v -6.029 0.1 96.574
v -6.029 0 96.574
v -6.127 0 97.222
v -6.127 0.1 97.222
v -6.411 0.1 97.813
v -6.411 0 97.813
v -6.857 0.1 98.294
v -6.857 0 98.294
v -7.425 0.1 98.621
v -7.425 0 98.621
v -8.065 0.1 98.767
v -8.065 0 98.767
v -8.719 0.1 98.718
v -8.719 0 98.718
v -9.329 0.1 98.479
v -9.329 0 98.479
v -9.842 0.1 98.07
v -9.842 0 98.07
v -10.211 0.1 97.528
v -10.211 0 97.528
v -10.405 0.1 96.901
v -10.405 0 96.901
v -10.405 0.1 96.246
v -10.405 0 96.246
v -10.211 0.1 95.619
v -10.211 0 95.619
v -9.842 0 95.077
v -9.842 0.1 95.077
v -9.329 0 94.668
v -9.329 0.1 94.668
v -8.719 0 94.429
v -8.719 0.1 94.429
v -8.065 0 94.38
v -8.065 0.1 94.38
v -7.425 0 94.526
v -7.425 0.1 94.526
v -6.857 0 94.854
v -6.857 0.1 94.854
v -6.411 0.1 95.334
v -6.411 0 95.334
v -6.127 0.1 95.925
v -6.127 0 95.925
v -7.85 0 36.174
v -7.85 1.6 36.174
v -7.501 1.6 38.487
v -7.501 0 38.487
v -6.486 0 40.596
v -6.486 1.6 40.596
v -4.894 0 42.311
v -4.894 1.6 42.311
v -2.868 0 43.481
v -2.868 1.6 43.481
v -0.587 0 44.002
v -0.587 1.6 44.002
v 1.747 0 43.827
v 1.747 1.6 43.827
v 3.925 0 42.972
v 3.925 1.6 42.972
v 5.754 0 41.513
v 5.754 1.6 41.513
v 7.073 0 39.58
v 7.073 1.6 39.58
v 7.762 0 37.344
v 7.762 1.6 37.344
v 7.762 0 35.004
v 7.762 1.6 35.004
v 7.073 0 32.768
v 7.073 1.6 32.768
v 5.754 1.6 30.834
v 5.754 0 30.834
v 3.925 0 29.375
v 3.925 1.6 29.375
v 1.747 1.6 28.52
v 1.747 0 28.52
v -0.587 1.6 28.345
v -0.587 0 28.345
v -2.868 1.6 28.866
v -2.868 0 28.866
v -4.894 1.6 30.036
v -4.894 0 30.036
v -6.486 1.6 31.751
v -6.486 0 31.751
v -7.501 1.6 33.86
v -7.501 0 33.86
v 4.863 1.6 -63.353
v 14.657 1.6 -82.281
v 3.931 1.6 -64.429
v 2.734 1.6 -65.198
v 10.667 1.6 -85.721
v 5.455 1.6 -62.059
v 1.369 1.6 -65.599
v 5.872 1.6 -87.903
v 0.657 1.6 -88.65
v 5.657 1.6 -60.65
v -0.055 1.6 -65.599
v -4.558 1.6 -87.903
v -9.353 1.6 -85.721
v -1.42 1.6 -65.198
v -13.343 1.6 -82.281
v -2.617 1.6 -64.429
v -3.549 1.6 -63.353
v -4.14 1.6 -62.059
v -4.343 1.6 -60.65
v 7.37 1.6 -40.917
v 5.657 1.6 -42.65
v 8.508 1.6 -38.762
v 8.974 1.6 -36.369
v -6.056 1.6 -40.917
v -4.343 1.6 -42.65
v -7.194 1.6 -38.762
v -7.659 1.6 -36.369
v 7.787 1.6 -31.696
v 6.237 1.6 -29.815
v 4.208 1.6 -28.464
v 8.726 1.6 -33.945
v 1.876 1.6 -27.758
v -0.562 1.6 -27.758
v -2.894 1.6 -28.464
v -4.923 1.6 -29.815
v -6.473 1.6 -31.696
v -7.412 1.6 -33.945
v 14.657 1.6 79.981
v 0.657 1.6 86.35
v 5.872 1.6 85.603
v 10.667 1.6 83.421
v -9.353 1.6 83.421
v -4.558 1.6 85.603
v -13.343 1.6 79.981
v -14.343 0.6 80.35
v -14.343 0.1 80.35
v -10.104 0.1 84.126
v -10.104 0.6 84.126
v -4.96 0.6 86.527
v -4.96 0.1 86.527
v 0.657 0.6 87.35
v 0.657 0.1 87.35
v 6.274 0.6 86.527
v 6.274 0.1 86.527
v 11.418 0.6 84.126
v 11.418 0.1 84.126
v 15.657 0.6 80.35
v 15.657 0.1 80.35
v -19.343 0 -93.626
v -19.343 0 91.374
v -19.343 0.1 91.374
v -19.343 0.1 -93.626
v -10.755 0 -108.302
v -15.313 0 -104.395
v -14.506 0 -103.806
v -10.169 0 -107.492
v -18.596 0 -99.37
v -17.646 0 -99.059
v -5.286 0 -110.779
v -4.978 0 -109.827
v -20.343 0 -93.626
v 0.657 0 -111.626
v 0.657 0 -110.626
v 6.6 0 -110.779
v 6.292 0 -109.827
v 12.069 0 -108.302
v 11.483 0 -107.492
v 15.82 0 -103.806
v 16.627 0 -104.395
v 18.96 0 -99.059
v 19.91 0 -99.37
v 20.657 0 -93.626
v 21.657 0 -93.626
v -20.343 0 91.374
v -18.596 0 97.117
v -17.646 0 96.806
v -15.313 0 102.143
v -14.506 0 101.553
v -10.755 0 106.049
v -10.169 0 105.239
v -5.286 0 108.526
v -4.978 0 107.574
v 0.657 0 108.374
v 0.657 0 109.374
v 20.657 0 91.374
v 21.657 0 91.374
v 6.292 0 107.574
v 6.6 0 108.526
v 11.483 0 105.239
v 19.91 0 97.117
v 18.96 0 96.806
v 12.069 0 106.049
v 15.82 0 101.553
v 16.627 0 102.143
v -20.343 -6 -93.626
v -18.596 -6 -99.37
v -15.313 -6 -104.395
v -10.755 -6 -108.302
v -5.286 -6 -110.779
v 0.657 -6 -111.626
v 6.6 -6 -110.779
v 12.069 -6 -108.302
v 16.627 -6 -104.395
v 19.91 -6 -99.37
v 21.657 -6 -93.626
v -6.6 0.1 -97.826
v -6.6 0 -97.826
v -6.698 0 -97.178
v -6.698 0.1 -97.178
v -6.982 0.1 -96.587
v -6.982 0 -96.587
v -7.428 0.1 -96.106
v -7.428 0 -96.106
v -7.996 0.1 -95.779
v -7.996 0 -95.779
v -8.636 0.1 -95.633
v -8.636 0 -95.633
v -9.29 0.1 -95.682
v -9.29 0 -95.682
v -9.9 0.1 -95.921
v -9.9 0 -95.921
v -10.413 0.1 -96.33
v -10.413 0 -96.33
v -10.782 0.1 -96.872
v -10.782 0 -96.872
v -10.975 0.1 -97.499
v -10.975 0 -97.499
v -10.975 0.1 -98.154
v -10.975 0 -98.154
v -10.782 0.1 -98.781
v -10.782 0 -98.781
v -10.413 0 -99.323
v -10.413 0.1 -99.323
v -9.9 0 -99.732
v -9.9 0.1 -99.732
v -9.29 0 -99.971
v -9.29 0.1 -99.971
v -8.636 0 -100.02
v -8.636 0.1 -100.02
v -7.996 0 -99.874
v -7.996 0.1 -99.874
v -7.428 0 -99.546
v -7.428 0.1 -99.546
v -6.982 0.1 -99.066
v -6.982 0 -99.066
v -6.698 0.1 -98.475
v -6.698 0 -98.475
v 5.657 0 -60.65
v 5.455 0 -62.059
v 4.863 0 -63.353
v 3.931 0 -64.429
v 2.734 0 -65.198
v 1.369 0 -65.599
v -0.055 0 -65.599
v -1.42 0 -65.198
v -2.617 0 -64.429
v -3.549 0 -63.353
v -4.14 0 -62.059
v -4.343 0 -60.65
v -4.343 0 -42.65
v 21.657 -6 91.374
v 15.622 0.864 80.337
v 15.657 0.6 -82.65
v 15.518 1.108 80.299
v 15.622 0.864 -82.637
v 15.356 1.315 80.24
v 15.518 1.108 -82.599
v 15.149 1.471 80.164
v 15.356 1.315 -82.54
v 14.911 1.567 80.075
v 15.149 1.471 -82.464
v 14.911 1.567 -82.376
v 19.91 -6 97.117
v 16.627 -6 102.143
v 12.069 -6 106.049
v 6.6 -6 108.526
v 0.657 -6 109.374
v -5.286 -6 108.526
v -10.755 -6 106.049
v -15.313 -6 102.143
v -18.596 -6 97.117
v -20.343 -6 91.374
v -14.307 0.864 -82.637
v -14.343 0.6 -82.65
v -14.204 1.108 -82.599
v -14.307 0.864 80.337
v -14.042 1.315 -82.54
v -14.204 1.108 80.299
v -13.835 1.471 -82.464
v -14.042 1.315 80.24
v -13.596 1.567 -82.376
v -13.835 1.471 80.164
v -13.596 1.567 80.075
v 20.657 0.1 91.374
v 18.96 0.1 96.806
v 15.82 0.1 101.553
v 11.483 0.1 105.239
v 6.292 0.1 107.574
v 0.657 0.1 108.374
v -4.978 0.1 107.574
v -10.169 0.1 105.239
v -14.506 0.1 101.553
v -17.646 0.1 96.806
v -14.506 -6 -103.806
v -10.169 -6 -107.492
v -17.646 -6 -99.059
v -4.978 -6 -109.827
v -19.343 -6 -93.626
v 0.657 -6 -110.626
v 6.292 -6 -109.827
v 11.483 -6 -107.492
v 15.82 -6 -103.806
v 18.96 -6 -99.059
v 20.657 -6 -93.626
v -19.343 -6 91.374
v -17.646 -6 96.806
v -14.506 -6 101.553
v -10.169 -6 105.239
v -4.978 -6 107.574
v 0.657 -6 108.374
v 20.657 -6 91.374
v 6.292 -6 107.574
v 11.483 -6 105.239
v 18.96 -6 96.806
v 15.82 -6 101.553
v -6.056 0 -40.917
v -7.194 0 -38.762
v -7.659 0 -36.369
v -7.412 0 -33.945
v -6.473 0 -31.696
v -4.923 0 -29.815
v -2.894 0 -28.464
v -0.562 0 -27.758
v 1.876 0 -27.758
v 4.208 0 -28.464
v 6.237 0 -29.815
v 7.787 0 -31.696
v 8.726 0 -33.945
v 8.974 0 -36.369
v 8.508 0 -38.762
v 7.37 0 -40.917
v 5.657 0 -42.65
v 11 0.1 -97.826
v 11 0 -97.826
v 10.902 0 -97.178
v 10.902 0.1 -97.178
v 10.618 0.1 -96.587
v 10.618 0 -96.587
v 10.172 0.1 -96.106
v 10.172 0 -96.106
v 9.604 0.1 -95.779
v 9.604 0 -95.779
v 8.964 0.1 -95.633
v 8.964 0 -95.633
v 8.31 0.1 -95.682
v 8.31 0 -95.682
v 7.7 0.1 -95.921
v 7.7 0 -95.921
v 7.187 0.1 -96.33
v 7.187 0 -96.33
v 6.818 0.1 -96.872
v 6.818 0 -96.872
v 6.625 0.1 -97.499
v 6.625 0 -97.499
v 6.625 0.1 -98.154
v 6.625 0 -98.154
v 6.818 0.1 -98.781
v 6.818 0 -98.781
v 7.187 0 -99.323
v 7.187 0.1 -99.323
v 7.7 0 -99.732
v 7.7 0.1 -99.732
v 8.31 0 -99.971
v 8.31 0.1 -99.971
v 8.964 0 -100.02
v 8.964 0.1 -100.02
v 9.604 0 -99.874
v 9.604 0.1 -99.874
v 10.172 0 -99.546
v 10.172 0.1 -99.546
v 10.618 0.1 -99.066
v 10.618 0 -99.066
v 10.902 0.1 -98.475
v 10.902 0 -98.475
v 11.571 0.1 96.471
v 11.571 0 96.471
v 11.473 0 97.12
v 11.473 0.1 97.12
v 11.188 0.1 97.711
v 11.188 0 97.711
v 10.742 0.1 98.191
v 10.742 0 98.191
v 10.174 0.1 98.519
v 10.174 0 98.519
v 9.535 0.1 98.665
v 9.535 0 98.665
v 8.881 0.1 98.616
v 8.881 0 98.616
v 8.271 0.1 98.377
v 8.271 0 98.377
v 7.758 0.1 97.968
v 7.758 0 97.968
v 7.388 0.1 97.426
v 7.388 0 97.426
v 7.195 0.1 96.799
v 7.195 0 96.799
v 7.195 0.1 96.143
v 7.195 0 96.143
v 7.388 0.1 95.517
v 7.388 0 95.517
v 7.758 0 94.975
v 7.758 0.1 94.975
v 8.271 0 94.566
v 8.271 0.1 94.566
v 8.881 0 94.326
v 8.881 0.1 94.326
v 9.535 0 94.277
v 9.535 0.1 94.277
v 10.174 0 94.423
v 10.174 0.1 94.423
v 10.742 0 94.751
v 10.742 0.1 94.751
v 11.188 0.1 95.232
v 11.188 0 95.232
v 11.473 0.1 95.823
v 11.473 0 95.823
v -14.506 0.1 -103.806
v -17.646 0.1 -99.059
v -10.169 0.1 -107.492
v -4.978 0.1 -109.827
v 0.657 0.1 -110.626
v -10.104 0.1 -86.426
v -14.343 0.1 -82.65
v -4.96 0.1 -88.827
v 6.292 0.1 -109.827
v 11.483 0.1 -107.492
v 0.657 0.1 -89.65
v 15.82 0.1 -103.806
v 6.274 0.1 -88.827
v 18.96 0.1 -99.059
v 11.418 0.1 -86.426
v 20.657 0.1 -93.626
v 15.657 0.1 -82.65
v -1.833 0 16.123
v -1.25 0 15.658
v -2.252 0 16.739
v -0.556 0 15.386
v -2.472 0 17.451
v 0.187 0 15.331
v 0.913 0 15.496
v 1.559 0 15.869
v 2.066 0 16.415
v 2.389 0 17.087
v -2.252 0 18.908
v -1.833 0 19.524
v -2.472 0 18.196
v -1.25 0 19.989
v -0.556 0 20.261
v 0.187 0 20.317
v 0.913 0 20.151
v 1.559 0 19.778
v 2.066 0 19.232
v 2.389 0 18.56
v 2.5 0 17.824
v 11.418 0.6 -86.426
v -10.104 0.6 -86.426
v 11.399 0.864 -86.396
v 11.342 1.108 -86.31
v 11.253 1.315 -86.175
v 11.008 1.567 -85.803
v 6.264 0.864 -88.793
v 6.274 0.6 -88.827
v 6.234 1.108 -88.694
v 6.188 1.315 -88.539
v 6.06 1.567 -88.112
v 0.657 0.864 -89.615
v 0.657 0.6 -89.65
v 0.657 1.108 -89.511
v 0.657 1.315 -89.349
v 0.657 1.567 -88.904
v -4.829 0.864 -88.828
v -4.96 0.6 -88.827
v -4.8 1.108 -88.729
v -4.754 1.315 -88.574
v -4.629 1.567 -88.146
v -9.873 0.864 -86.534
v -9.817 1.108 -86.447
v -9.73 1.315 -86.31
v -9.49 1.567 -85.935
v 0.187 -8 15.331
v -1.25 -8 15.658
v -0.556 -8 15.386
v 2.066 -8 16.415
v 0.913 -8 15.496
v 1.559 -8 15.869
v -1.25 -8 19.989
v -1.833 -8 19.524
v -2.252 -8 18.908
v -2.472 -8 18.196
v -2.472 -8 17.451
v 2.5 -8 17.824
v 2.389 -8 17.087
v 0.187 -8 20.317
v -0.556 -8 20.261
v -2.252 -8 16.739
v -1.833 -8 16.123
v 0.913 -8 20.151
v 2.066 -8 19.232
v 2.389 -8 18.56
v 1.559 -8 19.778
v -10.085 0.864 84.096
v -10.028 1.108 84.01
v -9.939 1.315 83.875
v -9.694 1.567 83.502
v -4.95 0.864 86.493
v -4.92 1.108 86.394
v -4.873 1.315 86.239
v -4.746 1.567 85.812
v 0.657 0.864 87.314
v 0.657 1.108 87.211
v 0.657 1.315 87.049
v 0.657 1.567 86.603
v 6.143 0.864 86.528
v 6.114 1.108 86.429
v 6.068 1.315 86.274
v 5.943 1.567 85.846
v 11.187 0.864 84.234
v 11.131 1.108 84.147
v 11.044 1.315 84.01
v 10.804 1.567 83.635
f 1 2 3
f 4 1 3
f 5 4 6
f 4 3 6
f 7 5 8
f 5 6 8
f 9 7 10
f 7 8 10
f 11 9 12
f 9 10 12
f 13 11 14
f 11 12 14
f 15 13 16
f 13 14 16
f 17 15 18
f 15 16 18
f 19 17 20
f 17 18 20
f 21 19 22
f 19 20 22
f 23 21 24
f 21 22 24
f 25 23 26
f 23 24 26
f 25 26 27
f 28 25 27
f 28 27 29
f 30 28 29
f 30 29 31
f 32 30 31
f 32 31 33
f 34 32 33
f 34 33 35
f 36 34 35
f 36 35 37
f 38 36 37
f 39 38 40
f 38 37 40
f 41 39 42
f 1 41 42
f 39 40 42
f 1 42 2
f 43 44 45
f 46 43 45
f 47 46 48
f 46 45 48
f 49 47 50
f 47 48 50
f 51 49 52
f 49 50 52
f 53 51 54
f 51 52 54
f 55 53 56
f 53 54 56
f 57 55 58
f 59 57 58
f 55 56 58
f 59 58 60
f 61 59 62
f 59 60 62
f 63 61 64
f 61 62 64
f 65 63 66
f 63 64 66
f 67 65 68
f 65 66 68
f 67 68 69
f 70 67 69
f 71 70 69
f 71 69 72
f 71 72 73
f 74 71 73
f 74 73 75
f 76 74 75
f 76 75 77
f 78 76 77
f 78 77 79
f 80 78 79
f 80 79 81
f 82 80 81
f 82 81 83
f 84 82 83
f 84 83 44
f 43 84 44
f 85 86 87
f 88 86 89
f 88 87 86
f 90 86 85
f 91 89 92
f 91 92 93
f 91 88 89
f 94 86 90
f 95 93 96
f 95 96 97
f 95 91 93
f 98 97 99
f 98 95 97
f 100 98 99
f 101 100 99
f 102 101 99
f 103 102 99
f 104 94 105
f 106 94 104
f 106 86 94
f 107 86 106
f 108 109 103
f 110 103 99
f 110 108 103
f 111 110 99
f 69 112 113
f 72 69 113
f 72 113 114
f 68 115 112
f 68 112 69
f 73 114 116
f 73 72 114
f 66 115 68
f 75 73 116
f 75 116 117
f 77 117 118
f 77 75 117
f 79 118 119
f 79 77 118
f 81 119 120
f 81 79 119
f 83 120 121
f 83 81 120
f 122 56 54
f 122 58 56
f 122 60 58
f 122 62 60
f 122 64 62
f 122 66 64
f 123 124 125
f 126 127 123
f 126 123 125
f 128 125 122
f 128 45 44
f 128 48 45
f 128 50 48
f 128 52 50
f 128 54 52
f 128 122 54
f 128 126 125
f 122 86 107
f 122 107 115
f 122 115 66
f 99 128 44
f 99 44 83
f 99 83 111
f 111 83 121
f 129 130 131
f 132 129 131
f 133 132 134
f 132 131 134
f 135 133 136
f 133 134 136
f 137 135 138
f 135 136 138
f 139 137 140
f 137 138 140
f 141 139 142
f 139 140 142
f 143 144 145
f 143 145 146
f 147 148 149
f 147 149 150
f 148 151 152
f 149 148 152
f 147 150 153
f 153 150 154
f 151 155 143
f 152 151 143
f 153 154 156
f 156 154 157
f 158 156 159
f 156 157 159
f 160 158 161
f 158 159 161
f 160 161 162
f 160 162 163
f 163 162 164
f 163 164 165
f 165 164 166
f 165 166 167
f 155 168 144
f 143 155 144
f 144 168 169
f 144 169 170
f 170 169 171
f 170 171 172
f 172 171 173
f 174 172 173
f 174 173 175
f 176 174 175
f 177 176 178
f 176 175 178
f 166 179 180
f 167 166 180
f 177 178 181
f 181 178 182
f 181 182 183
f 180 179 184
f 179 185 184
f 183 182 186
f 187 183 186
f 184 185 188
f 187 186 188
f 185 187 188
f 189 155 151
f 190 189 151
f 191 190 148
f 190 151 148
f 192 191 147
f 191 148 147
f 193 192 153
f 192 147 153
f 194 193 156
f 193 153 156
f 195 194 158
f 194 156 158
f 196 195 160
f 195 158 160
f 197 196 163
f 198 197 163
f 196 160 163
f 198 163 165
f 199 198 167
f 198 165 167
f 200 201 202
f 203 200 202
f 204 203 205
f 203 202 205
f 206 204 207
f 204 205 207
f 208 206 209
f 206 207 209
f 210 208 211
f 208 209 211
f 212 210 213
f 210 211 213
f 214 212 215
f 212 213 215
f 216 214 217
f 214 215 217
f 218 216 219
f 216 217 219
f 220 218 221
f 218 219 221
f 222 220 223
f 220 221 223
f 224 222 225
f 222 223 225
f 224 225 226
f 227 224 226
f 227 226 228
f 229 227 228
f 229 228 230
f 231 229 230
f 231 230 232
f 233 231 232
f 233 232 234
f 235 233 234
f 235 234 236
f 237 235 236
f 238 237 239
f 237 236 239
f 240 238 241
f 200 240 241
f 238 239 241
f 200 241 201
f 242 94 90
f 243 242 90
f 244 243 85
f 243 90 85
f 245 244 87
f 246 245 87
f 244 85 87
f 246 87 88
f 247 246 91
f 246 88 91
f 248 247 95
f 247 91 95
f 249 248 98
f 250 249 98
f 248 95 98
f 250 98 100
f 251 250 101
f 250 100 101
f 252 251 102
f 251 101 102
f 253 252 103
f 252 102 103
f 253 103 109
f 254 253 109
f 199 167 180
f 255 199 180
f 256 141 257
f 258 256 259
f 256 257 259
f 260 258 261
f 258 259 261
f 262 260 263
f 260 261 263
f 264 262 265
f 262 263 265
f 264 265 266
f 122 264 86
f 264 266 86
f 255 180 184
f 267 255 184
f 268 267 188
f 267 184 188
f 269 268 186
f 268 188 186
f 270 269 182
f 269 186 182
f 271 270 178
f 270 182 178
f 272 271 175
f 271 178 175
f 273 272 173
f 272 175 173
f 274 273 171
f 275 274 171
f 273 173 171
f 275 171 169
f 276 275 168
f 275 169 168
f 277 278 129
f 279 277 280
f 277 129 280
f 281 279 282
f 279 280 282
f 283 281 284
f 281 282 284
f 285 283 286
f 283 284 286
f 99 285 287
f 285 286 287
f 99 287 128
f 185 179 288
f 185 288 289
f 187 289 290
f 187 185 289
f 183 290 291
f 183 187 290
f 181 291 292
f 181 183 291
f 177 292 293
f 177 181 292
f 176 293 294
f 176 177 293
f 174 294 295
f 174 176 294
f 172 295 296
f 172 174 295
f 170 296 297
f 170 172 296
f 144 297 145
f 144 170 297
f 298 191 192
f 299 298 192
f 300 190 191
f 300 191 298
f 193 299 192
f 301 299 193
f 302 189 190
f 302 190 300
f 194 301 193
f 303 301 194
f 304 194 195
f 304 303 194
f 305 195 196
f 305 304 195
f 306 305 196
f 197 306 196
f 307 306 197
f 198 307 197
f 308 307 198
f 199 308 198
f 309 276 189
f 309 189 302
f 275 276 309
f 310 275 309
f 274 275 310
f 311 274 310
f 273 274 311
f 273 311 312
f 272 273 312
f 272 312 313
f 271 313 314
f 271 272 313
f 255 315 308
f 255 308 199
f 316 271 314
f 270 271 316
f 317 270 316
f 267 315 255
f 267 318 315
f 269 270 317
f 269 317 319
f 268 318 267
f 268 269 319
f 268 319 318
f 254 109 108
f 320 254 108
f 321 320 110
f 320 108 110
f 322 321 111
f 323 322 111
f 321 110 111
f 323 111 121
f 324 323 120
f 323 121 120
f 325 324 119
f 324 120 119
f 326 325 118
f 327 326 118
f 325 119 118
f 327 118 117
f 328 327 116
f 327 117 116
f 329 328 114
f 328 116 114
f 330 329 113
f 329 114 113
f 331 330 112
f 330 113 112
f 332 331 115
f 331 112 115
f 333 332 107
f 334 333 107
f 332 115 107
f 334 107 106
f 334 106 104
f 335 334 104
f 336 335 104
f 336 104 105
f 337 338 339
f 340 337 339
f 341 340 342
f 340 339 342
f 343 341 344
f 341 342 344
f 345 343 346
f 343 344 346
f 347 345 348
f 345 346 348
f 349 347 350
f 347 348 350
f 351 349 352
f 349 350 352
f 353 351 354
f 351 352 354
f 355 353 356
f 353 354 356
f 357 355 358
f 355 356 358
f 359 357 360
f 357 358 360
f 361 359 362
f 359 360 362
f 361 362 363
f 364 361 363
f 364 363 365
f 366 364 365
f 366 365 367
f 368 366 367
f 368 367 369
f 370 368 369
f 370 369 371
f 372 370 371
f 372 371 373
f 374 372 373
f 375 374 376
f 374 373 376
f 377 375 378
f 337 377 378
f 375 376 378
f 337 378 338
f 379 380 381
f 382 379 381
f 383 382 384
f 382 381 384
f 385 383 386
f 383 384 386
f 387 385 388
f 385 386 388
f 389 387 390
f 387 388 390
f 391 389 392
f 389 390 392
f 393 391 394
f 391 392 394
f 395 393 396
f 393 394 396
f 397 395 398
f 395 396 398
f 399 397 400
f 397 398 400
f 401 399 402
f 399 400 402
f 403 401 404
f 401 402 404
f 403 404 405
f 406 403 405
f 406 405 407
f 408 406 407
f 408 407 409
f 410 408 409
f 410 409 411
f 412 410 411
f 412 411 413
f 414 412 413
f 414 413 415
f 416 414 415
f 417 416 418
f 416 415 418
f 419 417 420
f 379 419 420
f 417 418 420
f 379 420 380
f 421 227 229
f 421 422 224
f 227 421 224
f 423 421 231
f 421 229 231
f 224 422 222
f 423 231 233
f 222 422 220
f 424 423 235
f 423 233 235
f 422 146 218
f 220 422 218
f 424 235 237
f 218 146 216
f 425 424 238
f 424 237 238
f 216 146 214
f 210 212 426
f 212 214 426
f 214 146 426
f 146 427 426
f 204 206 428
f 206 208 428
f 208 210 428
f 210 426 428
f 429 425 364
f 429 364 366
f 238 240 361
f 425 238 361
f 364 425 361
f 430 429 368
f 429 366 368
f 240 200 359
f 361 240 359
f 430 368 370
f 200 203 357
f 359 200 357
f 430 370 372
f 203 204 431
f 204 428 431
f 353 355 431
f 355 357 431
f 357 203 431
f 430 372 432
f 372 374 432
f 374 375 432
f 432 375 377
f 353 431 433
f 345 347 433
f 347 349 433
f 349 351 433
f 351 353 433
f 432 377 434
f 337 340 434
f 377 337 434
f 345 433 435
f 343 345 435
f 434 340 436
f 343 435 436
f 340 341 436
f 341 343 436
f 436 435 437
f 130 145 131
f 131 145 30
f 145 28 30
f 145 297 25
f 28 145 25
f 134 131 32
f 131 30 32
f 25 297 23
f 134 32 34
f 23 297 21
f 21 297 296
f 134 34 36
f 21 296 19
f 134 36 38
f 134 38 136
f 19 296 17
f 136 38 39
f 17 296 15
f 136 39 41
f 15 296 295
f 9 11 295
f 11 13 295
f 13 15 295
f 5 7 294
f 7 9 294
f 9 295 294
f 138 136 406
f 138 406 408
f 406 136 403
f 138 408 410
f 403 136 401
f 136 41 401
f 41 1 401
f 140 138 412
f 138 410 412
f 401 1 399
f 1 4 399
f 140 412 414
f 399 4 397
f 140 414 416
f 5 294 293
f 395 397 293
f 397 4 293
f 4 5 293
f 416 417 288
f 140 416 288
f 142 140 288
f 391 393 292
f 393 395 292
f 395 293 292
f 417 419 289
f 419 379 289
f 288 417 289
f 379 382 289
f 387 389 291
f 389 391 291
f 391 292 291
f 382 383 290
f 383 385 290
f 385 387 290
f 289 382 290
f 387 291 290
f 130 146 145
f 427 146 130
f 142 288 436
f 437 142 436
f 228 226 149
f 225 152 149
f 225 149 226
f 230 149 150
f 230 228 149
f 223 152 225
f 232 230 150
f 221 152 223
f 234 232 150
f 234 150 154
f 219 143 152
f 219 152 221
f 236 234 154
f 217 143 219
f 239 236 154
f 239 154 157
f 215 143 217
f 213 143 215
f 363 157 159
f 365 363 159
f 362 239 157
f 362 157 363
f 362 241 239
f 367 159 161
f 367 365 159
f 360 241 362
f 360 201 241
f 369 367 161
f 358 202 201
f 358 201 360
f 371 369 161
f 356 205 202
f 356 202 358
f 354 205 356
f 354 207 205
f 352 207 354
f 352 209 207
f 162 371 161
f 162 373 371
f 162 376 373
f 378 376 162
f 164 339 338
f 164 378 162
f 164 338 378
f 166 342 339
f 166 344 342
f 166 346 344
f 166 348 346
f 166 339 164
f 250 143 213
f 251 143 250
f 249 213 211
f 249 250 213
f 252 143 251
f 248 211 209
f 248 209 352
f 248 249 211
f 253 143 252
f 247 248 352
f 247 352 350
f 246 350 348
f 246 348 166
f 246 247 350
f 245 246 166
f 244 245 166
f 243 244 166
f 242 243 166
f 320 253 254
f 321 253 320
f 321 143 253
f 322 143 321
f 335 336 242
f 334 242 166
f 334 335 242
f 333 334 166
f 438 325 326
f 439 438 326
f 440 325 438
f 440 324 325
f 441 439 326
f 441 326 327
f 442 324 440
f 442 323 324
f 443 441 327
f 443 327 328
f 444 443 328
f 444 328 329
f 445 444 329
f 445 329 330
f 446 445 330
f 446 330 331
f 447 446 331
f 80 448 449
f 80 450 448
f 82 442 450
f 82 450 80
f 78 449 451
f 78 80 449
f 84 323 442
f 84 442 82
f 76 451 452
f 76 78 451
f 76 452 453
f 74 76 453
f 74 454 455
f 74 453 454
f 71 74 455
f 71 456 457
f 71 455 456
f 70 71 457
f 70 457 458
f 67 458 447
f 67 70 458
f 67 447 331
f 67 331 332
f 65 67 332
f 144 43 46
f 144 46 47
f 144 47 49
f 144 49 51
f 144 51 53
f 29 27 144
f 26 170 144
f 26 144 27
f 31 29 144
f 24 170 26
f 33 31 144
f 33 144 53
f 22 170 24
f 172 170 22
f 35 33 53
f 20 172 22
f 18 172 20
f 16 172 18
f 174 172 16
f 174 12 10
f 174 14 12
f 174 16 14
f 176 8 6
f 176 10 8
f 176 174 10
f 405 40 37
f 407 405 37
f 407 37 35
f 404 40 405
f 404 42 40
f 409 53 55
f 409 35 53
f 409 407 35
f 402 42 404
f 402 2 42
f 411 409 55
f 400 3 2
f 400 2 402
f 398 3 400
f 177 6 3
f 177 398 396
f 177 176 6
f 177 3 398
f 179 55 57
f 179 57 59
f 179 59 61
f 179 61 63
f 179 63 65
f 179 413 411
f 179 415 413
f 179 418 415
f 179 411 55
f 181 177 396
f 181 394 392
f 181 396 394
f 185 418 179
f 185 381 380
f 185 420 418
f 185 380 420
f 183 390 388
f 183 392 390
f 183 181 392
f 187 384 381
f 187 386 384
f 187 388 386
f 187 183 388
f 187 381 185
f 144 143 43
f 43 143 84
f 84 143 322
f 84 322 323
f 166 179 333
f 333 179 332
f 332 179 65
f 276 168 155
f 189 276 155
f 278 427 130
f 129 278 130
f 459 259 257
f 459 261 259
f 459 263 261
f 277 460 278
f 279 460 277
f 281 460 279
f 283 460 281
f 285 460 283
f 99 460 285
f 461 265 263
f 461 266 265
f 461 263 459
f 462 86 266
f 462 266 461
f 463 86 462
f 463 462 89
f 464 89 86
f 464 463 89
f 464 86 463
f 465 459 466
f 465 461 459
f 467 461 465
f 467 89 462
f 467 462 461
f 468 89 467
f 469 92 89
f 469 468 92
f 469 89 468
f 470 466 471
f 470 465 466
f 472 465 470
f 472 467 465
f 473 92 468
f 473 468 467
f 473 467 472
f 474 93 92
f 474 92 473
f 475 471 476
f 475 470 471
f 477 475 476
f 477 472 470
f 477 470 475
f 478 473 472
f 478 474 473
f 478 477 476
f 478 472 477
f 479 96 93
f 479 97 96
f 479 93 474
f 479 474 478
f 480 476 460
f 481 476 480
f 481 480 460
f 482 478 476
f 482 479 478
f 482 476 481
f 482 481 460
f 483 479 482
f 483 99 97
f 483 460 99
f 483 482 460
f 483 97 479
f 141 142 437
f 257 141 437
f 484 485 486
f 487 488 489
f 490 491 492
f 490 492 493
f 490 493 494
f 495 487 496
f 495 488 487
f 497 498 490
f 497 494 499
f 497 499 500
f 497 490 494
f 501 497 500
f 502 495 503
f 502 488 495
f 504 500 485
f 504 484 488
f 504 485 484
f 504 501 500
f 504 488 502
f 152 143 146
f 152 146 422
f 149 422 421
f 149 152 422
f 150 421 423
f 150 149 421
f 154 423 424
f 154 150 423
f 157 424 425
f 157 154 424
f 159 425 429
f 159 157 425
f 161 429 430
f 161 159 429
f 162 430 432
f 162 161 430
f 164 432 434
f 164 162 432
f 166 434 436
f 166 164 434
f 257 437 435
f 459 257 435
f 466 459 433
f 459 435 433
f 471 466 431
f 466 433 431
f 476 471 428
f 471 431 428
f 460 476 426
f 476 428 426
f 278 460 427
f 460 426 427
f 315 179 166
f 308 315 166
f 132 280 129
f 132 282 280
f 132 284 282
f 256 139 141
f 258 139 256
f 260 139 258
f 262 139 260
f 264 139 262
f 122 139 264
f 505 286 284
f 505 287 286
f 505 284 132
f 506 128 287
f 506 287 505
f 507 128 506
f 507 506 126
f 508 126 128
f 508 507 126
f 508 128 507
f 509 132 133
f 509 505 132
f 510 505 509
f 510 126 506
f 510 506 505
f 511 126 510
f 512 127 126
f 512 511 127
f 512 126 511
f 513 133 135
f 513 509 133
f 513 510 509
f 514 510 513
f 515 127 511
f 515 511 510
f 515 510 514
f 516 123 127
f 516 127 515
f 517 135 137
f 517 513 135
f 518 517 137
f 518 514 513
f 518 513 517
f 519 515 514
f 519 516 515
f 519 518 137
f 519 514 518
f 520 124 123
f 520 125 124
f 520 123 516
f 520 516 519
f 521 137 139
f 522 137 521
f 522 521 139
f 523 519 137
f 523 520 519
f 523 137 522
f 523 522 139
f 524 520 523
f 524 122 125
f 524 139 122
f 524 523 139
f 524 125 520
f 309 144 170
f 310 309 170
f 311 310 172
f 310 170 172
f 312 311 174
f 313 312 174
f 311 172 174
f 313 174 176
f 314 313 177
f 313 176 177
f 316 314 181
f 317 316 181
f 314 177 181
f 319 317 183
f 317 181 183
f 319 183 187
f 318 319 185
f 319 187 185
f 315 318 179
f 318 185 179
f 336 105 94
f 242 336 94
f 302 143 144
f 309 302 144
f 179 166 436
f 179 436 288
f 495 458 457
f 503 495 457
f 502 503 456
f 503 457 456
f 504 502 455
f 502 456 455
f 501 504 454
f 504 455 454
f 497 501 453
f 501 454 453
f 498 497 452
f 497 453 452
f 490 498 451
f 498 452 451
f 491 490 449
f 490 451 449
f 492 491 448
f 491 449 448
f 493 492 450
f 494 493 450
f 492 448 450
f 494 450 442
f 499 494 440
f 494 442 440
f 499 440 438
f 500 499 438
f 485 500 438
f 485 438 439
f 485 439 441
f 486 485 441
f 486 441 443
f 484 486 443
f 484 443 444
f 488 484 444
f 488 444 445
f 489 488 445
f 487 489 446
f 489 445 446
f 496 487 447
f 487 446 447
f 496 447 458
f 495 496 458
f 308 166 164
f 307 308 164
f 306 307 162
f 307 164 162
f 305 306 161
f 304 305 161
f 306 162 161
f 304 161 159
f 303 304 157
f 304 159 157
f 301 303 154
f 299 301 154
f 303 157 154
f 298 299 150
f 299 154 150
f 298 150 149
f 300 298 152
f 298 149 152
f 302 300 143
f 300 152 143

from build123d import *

# Parameters (mm, degrees)
F1_DEPTH = 6
F0_R     = 2.2
F2_DEPTH = 0.1
F4_DEPTH = 1.5
F5_R     = 1
F6_R     = 7.85
F7_DEPTH = 25
F8_R     = 2.5
F9_DEPTH = 8


with BuildPart() as f1:
    # F0 (on Front) → F1 (new body)
    with BuildSketch(Plane.XZ):
        with BuildLine():
            Line((21.657042, -93.626467), (21.657042, 91.373533))
            ThreePointArc((21.657042, 91.373533), (0.657042, 109.373533), (-20.342958, 91.373533))
            Line((-20.342958, 91.373533), (-20.342958, -93.626467))
            ThreePointArc((-20.342958, -93.626467), (0.657042, -111.626467), (21.657042, -93.626467))
        make_face()
        with BuildLine():
            Line((-19.342958, -93.626467), (-19.342958, 91.373533))
            ThreePointArc((-19.342958, 91.373533), (0.657042, 108.373533), (20.657042, 91.373533))
            Line((20.657042, 91.373533), (20.657042, -93.626467))
            ThreePointArc((20.657042, -93.626467), (0.657042, -110.626467), (-19.342958, -93.626467))
        make_face(mode=Mode.SUBTRACT)
    extrude(amount=F1_DEPTH)

    # F0 (on Front) → F2 (join)
    with BuildSketch(Plane.XZ):
        with BuildLine():
            ThreePointArc((20.657042, 91.373533), (0.657042, 108.373533), (-19.342958, 91.373533))
            Line((-19.342958, 91.373533), (-19.342958, -93.626467))
            ThreePointArc((-19.342958, -93.626467), (0.657042, -110.626467), (20.657042, -93.626467))
            Line((20.657042, -93.626467), (20.657042, 91.373533))
        make_face()
        with Locations((-8.8, -97.826467)):
            Circle(F0_R, mode=Mode.SUBTRACT)
        with Locations((8.8, -97.826467)):
            Circle(F0_R, mode=Mode.SUBTRACT)
        with Locations((-8.229091, 96.573533)):
            Circle(F0_R, mode=Mode.SUBTRACT)
        with Locations((9.370612, 96.471283)):
            Circle(F0_R, mode=Mode.SUBTRACT)
    extrude(amount=-F2_DEPTH)

    # F3 (on face) → F4 (join)
    with BuildSketch(Plane(origin=(0, 0.1, 0), x_dir=(-1, 0, 0), z_dir=(0, 1, 0))):
        with BuildLine():
            ThreePointArc((14.342958, 80.349935), (-0.657042, 87.349935), (-15.657042, 80.349935))
            Line((-15.657042, 80.349935), (-15.657042, -82.650065))
            ThreePointArc((-15.657042, -82.650065), (-0.657042, -89.650065), (14.342958, -82.650065))
            Line((14.342958, -82.650065), (14.342958, 80.349935))
        make_face()
    extrude(amount=F4_DEPTH)

    # F5
    f5_edges = [f1.edges().sort_by_distance(p)[0] for p in [
        (15.657042, 1.6, -1.150065),
        (0.657042, 1.6, -89.650065),
        (0.657042, 1.6, 87.349935),
        (-14.342958, 1.6, -1.150065),
    ]]
    fillet(f5_edges, radius=F5_R)

    # F6 (on face) → F7 (cut)
    with BuildSketch(Plane(origin=(0, 1.6, 0), x_dir=(-1, 0, 0), z_dir=(0, 1, 0))):
        with BuildLine():
            ThreePointArc((-5.657042, -60.650065), (-0.657042, -65.650065), (4.342958, -60.650065))
            Line((4.342958, -60.650065), (4.342958, -42.650065))
            ThreePointArc((4.342958, -42.650065), (-0.657042, -27.668818), (-5.657042, -42.650065))
            Line((-5.657042, -42.650065), (-5.657042, -60.650065))
        make_face()
        with Locations((0, 36.173533)):
            Circle(F6_R)
    extrude(amount=-F7_DEPTH, mode=Mode.SUBTRACT)

    # F8 (on face) → F9 (join)
    with BuildSketch(Plane.XZ):
        with Locations((0, 17.823533)):
            Circle(F8_R)
    extrude(amount=F9_DEPTH)


solid = f1.part
